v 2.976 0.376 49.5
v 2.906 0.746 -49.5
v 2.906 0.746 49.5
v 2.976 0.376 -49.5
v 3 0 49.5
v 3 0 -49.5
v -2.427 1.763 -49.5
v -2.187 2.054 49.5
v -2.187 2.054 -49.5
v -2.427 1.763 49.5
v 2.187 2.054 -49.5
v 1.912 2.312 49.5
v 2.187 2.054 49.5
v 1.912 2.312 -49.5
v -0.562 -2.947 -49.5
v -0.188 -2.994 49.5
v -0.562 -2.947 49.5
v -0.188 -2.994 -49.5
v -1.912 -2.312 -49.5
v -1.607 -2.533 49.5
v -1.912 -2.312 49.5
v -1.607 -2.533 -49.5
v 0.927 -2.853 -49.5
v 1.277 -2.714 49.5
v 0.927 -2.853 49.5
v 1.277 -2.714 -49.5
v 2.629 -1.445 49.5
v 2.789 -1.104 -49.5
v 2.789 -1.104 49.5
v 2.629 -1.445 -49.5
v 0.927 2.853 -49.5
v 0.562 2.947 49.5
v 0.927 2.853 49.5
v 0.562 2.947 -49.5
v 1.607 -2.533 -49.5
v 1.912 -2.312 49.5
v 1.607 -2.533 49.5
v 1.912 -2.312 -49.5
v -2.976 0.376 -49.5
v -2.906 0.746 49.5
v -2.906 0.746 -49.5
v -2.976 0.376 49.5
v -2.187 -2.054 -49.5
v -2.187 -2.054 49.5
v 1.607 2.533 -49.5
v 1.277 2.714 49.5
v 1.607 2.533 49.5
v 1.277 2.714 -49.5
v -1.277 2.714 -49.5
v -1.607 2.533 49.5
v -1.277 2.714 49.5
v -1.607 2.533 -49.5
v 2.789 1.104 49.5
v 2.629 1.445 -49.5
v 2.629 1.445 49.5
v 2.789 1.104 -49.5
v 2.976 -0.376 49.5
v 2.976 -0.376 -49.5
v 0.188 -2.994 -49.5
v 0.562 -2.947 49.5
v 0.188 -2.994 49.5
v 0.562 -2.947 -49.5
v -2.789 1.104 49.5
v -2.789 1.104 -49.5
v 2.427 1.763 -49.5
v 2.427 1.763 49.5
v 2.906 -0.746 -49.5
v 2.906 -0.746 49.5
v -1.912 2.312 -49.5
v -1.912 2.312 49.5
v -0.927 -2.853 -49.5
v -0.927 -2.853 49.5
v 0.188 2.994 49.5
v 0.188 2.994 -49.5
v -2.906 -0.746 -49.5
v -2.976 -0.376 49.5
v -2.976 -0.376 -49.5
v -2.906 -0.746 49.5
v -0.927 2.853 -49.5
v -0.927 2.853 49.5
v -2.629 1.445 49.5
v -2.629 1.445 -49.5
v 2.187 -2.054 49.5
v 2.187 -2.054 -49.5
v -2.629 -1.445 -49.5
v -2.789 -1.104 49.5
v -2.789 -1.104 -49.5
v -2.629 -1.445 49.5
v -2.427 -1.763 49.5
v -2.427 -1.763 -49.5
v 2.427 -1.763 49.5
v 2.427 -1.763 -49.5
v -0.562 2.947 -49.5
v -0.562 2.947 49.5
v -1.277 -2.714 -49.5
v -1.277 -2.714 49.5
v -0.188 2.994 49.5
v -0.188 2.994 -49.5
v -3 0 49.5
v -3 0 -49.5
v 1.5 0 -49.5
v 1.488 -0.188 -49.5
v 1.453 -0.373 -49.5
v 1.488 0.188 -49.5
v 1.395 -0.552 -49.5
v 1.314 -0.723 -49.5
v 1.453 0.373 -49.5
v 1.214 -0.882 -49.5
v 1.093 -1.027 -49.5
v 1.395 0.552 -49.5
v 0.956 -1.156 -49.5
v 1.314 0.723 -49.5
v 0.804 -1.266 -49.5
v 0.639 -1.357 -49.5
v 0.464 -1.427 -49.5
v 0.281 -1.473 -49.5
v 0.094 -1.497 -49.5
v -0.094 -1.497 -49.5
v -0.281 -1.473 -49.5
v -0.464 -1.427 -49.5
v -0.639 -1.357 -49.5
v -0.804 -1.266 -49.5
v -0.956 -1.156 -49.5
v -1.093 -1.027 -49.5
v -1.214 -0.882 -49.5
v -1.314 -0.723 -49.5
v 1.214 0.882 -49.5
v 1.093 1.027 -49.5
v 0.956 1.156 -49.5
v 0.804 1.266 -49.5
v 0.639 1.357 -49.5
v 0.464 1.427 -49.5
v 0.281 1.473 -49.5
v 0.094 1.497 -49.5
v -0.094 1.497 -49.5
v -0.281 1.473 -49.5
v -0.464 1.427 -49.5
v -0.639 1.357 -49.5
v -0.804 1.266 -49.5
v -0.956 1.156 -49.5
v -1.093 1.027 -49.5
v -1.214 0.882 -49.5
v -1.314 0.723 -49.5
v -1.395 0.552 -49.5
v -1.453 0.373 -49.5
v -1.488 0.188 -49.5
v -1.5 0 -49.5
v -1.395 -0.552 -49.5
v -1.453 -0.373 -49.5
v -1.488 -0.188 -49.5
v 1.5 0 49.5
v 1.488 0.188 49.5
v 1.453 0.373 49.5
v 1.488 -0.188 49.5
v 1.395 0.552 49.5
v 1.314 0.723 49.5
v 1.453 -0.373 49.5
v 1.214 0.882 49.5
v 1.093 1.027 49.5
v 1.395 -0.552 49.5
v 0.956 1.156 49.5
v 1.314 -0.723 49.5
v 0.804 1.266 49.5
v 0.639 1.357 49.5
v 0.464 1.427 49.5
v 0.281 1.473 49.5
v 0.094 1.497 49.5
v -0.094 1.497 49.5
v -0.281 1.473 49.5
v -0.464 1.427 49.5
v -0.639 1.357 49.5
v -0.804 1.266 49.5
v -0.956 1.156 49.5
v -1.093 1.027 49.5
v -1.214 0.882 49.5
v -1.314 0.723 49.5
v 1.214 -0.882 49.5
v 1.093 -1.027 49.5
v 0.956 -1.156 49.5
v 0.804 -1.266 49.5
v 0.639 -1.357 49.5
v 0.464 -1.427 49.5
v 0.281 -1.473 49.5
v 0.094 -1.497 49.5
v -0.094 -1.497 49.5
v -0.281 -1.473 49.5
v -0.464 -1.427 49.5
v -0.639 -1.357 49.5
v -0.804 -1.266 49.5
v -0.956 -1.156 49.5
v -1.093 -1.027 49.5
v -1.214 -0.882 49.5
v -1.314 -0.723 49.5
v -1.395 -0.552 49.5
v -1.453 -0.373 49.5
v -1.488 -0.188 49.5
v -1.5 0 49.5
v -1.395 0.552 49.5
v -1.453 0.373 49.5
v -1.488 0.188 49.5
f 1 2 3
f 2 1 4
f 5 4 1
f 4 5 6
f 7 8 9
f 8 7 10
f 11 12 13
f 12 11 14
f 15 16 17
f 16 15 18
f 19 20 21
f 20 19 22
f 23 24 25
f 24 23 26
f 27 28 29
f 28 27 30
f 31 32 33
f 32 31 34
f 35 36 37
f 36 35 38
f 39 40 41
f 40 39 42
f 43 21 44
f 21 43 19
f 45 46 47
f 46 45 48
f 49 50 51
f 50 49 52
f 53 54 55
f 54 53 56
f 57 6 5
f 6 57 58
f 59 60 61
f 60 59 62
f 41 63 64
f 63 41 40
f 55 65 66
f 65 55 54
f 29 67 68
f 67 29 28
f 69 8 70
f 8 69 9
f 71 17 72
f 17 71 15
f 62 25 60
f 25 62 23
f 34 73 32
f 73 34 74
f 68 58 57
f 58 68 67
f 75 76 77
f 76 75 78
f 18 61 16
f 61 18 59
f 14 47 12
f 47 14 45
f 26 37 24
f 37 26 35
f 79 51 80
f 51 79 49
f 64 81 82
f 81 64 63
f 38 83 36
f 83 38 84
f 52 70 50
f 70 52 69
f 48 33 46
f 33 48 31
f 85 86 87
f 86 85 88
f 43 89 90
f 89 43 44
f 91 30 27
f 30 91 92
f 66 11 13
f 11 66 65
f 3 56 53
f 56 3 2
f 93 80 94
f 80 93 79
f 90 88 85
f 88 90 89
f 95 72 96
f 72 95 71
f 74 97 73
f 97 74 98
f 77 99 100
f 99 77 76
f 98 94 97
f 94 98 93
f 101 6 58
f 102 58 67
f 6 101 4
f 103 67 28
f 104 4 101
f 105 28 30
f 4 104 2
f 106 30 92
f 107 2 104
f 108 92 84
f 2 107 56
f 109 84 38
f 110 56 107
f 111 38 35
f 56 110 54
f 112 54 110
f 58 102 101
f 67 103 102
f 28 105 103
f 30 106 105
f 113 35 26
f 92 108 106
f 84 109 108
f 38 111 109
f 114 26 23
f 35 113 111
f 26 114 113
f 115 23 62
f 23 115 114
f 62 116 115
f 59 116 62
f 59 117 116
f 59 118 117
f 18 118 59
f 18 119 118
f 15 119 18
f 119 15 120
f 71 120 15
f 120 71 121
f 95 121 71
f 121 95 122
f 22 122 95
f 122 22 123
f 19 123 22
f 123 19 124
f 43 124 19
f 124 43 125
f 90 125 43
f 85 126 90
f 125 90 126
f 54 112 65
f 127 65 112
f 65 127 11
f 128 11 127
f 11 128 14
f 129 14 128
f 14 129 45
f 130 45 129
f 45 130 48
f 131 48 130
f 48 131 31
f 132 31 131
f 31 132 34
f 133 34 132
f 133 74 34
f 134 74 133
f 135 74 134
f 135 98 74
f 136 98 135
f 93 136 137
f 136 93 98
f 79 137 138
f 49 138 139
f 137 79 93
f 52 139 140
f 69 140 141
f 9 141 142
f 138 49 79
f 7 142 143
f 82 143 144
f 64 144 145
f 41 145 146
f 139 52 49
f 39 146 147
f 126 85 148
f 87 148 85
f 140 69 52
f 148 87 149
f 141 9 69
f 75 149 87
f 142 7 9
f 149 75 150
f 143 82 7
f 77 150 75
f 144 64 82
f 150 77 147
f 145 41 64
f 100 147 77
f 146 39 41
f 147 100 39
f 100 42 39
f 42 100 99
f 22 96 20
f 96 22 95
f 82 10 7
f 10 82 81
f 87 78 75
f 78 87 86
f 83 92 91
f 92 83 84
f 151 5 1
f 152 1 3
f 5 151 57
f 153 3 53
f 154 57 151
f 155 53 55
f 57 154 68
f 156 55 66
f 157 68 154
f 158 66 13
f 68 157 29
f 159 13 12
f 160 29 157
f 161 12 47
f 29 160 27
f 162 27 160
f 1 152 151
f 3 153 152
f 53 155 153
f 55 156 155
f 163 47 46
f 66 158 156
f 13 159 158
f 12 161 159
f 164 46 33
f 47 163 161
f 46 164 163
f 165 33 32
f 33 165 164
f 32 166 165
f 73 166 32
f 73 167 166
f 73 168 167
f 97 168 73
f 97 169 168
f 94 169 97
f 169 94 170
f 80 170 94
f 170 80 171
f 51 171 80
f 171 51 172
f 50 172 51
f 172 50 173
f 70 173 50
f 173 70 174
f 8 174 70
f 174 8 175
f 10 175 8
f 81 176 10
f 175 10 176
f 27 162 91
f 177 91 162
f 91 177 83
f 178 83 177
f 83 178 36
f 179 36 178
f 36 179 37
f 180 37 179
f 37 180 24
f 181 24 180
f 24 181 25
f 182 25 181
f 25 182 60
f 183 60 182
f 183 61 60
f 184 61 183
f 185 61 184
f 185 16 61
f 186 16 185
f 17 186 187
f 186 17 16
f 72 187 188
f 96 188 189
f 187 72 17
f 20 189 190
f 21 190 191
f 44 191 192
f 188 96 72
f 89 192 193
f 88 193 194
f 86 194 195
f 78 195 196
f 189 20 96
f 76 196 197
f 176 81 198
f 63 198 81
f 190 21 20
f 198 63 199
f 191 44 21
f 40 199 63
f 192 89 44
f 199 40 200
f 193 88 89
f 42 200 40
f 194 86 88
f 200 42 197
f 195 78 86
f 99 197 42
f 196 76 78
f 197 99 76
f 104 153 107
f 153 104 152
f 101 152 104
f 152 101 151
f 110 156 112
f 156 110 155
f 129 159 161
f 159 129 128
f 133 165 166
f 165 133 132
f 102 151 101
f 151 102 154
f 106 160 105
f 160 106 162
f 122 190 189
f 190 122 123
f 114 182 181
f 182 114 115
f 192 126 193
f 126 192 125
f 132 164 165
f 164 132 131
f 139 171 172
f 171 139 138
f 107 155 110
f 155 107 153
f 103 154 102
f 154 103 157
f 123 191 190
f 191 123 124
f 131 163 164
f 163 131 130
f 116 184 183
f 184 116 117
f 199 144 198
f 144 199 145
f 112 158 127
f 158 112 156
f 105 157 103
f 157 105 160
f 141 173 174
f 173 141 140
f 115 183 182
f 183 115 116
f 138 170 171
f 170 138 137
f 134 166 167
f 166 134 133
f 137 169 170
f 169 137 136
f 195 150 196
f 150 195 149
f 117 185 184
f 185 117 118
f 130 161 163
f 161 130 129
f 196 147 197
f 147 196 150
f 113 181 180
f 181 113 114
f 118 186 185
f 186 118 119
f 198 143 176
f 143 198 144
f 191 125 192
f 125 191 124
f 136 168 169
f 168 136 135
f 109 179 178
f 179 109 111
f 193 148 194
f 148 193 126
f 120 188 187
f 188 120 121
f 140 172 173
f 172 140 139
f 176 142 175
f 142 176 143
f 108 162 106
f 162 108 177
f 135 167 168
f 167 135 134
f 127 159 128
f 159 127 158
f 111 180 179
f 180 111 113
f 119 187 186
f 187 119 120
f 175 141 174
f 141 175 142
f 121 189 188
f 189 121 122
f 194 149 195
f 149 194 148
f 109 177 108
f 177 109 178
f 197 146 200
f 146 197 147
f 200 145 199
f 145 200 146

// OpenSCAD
$fn = 50;


difference() {
	union() {
		translate(v = [0, 0, -49.5000000000]) {
			cylinder(h = 99, r = 3.0000000000);
		}
	}
	union() {
		translate(v = [0, 0, -100.0000000000]) {
			cylinder(h = 200, r = 1.5000000000);
		}
	}
}
